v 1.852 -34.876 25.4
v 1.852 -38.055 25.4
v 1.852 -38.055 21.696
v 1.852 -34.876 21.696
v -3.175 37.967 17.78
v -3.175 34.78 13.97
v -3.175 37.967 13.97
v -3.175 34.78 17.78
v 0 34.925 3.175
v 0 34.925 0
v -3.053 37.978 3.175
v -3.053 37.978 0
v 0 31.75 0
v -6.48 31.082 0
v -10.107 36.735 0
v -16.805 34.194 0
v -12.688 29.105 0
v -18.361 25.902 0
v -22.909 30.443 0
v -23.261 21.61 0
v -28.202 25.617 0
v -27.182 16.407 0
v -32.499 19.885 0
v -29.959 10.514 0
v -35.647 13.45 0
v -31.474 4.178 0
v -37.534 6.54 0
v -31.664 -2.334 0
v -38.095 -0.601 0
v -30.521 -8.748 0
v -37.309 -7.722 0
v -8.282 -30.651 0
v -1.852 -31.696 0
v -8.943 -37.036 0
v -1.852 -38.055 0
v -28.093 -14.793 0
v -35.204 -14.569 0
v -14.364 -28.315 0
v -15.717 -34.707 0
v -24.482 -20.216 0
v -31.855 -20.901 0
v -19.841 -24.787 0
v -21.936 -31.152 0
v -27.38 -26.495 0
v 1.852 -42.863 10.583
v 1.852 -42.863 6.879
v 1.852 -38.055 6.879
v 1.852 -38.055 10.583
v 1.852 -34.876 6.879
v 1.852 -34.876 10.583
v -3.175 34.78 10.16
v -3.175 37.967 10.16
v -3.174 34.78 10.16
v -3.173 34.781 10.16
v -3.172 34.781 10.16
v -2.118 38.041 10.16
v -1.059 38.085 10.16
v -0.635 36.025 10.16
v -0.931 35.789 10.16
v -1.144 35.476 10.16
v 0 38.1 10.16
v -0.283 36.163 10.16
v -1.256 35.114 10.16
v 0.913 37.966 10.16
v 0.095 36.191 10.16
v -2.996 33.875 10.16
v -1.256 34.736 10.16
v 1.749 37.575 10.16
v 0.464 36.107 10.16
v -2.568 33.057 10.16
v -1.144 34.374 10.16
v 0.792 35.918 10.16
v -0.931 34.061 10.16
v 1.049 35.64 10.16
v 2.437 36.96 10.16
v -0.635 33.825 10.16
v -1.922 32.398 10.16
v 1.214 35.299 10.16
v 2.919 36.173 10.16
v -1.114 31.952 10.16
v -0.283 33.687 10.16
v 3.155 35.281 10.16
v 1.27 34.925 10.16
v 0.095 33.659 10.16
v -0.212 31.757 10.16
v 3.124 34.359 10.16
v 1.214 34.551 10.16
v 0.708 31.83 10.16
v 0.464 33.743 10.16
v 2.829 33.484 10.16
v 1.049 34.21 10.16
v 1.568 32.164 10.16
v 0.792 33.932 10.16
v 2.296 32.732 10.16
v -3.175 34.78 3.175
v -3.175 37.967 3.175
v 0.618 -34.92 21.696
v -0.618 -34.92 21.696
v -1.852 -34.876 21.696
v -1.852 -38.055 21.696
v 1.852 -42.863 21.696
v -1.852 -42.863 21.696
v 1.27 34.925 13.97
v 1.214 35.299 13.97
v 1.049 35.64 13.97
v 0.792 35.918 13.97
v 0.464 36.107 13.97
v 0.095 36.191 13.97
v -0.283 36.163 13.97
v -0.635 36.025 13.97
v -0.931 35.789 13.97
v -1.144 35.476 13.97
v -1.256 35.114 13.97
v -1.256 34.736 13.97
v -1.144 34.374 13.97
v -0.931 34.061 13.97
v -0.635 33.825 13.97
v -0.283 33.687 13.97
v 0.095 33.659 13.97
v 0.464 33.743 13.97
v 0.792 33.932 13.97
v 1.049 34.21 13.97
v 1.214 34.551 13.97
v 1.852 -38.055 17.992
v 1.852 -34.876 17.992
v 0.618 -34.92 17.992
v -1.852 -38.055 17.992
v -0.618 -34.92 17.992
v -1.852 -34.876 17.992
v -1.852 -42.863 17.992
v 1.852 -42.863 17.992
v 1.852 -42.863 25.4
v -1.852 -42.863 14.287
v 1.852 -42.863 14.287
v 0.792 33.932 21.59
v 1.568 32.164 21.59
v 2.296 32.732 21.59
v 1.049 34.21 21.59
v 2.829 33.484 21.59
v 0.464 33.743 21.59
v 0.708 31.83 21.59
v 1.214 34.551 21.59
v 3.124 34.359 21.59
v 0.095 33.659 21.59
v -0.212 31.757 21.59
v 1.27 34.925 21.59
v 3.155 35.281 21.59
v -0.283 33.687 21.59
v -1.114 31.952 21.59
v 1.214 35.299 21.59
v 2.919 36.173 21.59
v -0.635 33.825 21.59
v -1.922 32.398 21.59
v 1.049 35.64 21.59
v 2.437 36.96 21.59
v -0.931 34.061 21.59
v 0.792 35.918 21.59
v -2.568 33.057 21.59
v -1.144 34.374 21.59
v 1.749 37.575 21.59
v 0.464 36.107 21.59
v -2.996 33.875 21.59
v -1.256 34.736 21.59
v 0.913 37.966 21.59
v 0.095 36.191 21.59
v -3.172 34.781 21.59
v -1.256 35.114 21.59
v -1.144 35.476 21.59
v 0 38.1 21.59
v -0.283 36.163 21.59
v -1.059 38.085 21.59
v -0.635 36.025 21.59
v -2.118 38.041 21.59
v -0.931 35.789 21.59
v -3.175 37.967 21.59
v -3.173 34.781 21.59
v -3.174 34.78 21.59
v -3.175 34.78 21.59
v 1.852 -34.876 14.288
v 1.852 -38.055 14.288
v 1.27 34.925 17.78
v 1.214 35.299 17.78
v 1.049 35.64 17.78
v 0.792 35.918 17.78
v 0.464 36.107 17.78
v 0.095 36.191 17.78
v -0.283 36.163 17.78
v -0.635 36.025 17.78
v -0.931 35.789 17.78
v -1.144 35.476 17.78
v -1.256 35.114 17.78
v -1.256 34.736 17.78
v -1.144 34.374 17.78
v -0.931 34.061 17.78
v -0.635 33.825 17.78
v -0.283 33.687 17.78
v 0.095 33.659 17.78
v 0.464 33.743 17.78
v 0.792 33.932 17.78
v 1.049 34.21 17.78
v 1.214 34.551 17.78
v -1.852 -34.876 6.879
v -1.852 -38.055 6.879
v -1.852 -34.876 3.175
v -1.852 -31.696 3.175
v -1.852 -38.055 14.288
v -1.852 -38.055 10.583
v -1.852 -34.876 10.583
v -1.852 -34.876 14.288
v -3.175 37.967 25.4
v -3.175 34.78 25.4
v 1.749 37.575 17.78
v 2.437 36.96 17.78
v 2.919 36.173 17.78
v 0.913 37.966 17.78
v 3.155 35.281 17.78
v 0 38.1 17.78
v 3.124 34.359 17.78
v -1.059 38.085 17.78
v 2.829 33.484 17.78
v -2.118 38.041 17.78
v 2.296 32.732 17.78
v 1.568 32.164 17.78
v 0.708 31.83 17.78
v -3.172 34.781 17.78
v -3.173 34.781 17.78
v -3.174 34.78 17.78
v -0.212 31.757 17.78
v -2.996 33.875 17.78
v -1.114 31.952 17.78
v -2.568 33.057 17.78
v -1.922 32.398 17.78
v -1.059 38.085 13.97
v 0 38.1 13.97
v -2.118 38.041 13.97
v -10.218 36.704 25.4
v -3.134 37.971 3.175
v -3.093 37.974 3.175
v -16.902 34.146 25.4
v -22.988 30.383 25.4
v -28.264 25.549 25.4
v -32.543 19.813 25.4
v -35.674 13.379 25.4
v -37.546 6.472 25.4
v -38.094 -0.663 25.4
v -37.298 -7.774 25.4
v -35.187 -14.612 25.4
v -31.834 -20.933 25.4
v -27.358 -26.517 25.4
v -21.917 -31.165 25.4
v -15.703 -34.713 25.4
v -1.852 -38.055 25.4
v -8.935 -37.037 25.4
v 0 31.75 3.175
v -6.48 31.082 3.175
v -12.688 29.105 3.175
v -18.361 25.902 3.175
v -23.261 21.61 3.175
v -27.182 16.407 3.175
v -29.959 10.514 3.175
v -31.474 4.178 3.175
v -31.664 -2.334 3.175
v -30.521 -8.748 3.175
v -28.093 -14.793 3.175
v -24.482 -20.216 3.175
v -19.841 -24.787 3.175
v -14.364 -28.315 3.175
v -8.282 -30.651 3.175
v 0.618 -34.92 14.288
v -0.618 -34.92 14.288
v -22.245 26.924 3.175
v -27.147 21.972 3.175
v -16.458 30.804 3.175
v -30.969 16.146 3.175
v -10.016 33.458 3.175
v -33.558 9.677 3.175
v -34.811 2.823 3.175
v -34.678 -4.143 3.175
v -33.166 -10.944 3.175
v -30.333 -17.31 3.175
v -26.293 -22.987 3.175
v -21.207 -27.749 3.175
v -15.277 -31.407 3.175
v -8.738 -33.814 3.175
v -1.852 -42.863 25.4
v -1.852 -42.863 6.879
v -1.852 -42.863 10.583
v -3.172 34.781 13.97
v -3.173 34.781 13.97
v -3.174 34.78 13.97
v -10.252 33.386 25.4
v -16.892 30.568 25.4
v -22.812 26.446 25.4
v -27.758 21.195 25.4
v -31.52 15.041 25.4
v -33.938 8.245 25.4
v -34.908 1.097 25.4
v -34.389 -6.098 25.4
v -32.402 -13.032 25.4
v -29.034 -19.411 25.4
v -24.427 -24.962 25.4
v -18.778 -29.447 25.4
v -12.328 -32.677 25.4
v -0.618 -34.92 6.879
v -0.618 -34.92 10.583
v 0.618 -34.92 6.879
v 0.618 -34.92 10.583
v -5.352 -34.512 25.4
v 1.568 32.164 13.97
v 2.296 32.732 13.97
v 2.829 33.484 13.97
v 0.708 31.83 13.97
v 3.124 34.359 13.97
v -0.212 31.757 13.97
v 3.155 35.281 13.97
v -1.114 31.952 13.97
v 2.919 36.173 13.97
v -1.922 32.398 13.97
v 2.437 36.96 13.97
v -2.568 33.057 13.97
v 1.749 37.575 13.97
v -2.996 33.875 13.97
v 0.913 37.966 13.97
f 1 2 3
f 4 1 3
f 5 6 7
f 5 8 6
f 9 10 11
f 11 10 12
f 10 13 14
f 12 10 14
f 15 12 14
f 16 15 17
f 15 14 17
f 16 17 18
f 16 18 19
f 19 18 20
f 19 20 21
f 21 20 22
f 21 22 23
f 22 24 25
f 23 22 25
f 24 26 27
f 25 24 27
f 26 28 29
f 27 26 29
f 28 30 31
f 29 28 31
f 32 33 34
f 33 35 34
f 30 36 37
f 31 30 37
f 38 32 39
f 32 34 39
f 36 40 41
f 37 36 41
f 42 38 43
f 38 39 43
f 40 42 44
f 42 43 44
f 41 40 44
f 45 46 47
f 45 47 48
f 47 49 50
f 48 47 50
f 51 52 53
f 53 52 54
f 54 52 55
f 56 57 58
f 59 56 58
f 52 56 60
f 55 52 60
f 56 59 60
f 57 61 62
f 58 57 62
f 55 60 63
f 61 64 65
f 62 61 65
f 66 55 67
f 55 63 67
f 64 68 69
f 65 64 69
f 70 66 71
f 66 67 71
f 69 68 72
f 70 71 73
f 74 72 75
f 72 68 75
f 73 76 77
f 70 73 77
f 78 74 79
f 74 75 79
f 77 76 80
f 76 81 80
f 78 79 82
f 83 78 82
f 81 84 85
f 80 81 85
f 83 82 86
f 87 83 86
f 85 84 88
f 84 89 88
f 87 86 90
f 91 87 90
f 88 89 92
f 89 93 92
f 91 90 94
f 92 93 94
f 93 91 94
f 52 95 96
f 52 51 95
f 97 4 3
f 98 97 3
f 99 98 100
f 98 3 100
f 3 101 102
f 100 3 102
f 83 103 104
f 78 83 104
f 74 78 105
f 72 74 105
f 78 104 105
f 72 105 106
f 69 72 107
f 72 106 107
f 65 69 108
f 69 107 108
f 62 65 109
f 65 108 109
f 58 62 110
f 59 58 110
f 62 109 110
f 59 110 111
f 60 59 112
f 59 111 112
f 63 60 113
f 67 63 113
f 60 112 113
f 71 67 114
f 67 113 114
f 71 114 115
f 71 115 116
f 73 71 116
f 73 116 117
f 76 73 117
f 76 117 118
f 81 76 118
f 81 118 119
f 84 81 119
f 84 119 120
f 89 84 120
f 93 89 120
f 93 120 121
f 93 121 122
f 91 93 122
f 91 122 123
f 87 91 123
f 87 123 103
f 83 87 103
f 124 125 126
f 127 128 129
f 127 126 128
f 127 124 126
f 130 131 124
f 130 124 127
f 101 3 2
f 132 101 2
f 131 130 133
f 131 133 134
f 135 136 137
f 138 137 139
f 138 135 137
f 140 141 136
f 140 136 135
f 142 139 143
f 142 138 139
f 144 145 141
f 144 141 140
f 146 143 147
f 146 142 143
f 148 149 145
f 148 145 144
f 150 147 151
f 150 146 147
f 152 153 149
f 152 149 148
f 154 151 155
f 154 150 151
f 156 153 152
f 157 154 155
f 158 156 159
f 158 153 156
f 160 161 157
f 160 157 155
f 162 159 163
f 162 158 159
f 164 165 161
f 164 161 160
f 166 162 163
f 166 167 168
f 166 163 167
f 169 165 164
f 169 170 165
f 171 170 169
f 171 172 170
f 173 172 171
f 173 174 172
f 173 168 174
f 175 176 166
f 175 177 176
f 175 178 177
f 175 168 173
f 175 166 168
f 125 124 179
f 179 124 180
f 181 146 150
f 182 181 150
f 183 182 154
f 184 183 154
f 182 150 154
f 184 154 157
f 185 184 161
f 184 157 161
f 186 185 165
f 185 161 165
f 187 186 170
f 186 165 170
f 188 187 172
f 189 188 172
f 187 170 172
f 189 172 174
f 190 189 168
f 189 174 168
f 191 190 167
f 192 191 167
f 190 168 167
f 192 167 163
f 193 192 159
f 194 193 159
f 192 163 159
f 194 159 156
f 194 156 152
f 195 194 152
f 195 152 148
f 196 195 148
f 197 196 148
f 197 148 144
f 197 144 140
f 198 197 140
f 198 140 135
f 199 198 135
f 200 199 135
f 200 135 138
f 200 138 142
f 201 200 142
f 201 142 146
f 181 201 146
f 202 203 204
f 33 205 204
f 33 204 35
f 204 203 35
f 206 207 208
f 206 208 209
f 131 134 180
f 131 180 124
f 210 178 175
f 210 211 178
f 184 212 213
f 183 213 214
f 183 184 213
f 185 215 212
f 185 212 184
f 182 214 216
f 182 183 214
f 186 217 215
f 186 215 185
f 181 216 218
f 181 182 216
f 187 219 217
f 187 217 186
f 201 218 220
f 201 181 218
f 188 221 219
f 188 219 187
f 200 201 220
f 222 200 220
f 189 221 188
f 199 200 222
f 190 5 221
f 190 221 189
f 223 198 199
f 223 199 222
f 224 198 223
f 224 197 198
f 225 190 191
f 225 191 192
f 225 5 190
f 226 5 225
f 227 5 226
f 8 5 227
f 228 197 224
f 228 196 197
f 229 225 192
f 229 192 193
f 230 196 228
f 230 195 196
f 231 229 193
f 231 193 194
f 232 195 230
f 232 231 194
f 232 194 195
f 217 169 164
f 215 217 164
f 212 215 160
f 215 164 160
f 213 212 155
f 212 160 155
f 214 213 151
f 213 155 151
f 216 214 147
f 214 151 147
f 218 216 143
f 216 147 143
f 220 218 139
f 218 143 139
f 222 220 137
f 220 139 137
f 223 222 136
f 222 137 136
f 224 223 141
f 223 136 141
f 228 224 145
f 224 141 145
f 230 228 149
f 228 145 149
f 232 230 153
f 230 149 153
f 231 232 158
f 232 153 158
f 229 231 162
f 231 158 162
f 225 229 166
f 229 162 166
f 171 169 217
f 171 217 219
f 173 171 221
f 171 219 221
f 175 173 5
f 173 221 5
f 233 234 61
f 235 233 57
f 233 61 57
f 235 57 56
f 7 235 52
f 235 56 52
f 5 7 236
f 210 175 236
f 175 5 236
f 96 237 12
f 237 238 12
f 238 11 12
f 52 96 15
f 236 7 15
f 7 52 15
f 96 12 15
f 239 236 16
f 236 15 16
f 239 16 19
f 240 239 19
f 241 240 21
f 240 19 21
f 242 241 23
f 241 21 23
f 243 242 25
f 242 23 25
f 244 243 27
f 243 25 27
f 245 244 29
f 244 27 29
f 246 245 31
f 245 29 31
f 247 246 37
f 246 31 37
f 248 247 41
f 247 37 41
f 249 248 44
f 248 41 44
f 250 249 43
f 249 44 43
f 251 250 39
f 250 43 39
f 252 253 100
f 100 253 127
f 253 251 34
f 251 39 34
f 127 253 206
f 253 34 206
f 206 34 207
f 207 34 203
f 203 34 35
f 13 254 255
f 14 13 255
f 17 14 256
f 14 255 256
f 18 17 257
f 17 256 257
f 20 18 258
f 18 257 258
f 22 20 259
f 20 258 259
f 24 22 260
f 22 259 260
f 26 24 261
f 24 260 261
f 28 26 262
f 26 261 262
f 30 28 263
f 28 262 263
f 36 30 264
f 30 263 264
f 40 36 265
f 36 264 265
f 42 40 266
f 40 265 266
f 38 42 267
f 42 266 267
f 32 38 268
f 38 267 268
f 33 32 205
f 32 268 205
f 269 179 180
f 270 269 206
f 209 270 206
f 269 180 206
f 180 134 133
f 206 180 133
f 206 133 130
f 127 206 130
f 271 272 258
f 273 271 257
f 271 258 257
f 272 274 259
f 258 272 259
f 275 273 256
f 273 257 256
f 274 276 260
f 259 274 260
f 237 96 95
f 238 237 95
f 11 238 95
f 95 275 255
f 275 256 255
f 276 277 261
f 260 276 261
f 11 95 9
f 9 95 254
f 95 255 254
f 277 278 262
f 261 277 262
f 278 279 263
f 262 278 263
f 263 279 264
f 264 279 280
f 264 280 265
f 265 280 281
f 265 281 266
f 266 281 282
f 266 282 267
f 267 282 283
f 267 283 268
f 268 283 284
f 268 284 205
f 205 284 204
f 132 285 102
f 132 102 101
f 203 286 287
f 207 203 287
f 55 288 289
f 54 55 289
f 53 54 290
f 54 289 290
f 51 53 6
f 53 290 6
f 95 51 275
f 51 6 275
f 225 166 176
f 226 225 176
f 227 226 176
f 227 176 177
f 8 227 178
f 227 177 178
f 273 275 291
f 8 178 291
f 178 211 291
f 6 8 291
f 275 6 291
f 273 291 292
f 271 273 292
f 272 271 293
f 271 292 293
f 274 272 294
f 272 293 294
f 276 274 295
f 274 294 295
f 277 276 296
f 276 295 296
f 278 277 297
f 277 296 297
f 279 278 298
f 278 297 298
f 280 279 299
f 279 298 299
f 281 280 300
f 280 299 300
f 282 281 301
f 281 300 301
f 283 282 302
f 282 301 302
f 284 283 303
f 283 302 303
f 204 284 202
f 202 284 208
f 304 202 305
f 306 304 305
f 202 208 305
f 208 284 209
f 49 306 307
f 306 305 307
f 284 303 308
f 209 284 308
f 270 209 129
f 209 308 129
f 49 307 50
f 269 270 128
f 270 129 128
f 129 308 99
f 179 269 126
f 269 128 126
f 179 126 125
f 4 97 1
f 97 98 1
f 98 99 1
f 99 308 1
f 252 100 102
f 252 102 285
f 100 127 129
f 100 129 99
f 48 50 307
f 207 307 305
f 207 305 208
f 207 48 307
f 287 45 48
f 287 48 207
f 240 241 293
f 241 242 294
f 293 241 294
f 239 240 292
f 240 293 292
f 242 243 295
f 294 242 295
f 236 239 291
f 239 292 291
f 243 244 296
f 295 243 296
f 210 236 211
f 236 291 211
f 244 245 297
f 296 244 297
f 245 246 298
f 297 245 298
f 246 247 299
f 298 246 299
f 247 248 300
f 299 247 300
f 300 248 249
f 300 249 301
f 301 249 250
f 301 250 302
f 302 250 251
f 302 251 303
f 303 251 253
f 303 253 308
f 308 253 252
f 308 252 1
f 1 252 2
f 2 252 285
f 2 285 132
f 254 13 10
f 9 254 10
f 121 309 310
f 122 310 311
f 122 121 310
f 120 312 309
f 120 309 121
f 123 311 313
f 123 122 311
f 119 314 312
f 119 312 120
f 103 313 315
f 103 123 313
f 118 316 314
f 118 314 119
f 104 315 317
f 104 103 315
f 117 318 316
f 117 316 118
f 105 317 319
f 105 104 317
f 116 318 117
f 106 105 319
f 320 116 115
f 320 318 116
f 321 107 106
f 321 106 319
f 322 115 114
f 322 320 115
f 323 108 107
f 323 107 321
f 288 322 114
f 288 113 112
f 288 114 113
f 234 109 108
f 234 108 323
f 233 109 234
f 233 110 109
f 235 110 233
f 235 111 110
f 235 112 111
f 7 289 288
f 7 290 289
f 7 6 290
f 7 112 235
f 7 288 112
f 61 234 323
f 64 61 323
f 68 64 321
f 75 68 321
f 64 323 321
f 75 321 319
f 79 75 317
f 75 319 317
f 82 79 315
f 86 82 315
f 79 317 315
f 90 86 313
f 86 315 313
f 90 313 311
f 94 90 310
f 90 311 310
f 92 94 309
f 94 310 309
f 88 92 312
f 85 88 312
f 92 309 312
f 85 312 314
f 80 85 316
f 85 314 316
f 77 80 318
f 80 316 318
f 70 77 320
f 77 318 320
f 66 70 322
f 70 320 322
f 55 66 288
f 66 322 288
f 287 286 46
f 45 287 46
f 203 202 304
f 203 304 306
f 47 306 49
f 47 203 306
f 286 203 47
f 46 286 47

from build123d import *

# Parameters (mm, degrees)
F3_W           = 1.8520833333
F3_H           = 3.7041666667
F3_H_2         = 3.175
F4_DEPTH       = 38.1
F6_DEPTH       = 25.401
F7_R           = 3.175
F8_DEPTH       = 15.24
F9_R           = 1.27
F10_DEPTH      = 22.225
F11_W          = 3.175
F11_H          = 3.81
F11_H_2        = 6.985
F12_DEPTH      = 3.175
F13_DEPTH      = 4.7625
F13_DEPTH_BACK = 3.175
F15_DEPTH      = 3.175


# Not quite as in the source:
# - a length typed as a fraction of an inch, garbled in the dataset ("3 / 203.2 mm" for 3/8 in), is restored
# - a feature names something its author has since deleted; it is built from what else it names


with BuildPart() as f1:
    # F0 (on Front) → F1 (revolve)
    with BuildSketch(Plane.XZ):
        Polygon((-38.1, 0), (-31.75, 0), (-31.75, 3.175), (-34.925, 3.175), (-34.925, 25.4), (-38.1, 25.4), align=None)
    revolve(axis=Axis((0, 0, 12.7), (0, 0, 1)))

    # F3 (on offset) → F4 (cut, symmetric)
    with BuildSketch(Plane.XZ.offset(38.1)):
        with Locations((-0.9260416667, 5.0270833333)):
            Rectangle(F3_W, F3_H)
        with Locations((0.9260416667, 5.0270833333)):
            Rectangle(F3_W, F3_H)
        with Locations((0.9260416667, 12.4354166667)):
            Rectangle(F3_W, F3_H)
        with Locations((-0.9260416667, 12.4354166667)):
            Rectangle(F3_W, F3_H)
        with Locations((-0.9260416667, 19.84375)):
            Rectangle(F3_W, F3_H)
        Polygon((1.8520833333, 3.175), (1.8520833333, 0), (50.8, 0), (50.8, 25.4), (1.8520833333, 25.4), (1.8520833333, 21.6958333333), (1.8520833333, 17.9916666667), (1.8520833333, 14.2875), (1.8520833333, 10.5833333333), (1.8520833333, 6.8791666667), align=None)
        with Locations((0.9260416667, 19.84375)):
            Rectangle(F3_W, F3_H)
        with Locations((0.9260416667, 1.5875)):
            Rectangle(F3_W, F3_H_2)
        with Locations((-0.9260416667, 1.5875)):
            Rectangle(F3_W, F3_H_2)
    extrude(amount=F4_DEPTH, both=True, mode=Mode.SUBTRACT)

    # F5 (on face) → F6 (cut, through all)
    with BuildSketch(Plane.XY.offset(25.4)):
        with BuildLine():
            ThreePointArc((0, 38.1), (3.175, 34.925), (0, 31.75))
            ThreePointArc((0, 31.75), (22.4506403027, 22.4506403027), (31.75, 0))
            Line((31.75, 0), (41.275, 0))
            ThreePointArc((41.275, 0), (27.0107441469, 31.2096992237), (-5.922835282, 40.847835282))
            Line((-5.922835282, 40.847835282), (-3.0525211735, 37.9775211735))
            ThreePointArc((-3.0525211735, 37.9775211735), (-1.5274886724, 38.0693679795), (0, 38.1))
        make_face()
    extrude(amount=-F6_DEPTH, mode=Mode.SUBTRACT)

    # F7 (on face) → F8 (join)
    with BuildSketch(Plane.XY.offset(25.4)):
        with Locations((0, 34.925)):
            Circle(F7_R)
    extrude(amount=-F8_DEPTH)

    # F9 (on face) → F10 (cut)
    with BuildSketch(Plane.XY.offset(25.4)):
        with Locations((0, 34.925)):
            Circle(F9_R)
    extrude(amount=-F10_DEPTH, mode=Mode.SUBTRACT)

    # F11 (on Right) → F12 (cut, symmetric)
    with BuildSketch(Plane.YZ):
        with Locations((36.5125, 23.495)):
            Rectangle(F11_W, F11_H)
        with Locations((33.3375, 23.495)):
            Rectangle(F11_W, F11_H)
        with Locations((36.5125, 15.875)):
            Rectangle(F11_W, F11_H)
        with Locations((36.5125, 6.6675)):
            Rectangle(F11_W, F11_H_2)
        with Locations((33.3375, 6.6675)):
            Rectangle(F11_W, F11_H_2)
        with Locations((33.3375, 15.875)):
            Rectangle(F11_W, F11_H)
    extrude(amount=F12_DEPTH, both=True, mode=Mode.SUBTRACT)

    # F3 (on offset) → F13 (join, two sides)
    with BuildSketch(Plane.XZ.offset(38.1)) as f13_sk:
        with Locations((-0.9260416667, 8.73125)):
            Rectangle(F3_W, F3_H)
        with Locations((0.9260416667, 8.73125)):
            Rectangle(F3_W, F3_H)
        with Locations((-0.9260416667, 16.1395833333)):
            Rectangle(F3_W, F3_H)
        with Locations((0.9260416667, 16.1395833333)):
            Rectangle(F3_W, F3_H)
        with Locations((-0.9260416667, 23.5479166667)):
            Rectangle(F3_W, F3_H)
        with Locations((0.9260416667, 23.5479166667)):
            Rectangle(F3_W, F3_H)
    extrude(amount=F13_DEPTH)
    extrude(f13_sk.sketch, amount=-F13_DEPTH_BACK)

    # F14 (on face) → F15 (cut)
    with BuildSketch(Plane(origin=(0, 0, 0), x_dir=(1, 0, 0), z_dir=(0, 0, -1))):
        with BuildLine():
            Line((0, -31.75), (0, -34.925))
            Line((0, -34.925), (-3.0525211735, -37.9775211735))
            ThreePointArc((-3.0525211735, -37.9775211735), (-1.5274886724, -38.0693679795), (0, -38.1))
            ThreePointArc((0, -38.1), (3.175, -34.925), (0, -31.75))
        make_face()
    extrude(amount=-F15_DEPTH, mode=Mode.SUBTRACT)


solid = f1.part
